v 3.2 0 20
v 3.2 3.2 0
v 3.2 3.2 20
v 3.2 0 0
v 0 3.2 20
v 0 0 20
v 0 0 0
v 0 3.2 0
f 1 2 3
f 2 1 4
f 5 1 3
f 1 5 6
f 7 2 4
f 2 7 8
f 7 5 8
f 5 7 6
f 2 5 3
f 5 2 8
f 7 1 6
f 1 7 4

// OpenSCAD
$fn = 64;

size = [28, 28, 20];   // overall bounding box [X,Y,Z]
wall = 3;              // leg thickness (X and Y directions)
hole_d = 5;            // mounting hole diameter
hole_edge = 8;         // distance from outer edges to hole centers
fillet_r = 2;          // outer corner rounding

eps = 0.2;

module rounded_box(sz=[10,10,10], r=1){
    r2 = min(r, sz[0]/2, sz[1]/2);
    linear_extrude(height=sz[2], center=false, convexity=10)
        offset(r=r2)
            square([sz[0]-2*r2, sz[1]-2*r2], center=false);
}

module extrusion_bracket(){
    difference(){
        union(){
            // Leg along X (thickness in Y = wall)
            rounded_box([size[0], wall, size[2]], fillet_r);

            // Leg along Y (thickness in X = wall)
            rounded_box([wall, size[1], size[2]], fillet_r);

            // Ensure a robust connected solid at the inside corner
            cube([wall+eps, wall+eps, size[2]], center=false);
        }

        // Holes through Z on X-leg (two holes)
        for (xpos = [hole_edge, size[0]-hole_edge])
            translate([xpos, wall/2, -eps])
                cylinder(d=hole_d, h=size[2]+2*eps, center=false);

        // Hole through Z on Y-leg (one hole)
        translate([wall/2, size[1]-hole_edge, -eps])
            cylinder(d=hole_d, h=size[2]+2*eps, center=false);
    }
}

extrusion_bracket();
